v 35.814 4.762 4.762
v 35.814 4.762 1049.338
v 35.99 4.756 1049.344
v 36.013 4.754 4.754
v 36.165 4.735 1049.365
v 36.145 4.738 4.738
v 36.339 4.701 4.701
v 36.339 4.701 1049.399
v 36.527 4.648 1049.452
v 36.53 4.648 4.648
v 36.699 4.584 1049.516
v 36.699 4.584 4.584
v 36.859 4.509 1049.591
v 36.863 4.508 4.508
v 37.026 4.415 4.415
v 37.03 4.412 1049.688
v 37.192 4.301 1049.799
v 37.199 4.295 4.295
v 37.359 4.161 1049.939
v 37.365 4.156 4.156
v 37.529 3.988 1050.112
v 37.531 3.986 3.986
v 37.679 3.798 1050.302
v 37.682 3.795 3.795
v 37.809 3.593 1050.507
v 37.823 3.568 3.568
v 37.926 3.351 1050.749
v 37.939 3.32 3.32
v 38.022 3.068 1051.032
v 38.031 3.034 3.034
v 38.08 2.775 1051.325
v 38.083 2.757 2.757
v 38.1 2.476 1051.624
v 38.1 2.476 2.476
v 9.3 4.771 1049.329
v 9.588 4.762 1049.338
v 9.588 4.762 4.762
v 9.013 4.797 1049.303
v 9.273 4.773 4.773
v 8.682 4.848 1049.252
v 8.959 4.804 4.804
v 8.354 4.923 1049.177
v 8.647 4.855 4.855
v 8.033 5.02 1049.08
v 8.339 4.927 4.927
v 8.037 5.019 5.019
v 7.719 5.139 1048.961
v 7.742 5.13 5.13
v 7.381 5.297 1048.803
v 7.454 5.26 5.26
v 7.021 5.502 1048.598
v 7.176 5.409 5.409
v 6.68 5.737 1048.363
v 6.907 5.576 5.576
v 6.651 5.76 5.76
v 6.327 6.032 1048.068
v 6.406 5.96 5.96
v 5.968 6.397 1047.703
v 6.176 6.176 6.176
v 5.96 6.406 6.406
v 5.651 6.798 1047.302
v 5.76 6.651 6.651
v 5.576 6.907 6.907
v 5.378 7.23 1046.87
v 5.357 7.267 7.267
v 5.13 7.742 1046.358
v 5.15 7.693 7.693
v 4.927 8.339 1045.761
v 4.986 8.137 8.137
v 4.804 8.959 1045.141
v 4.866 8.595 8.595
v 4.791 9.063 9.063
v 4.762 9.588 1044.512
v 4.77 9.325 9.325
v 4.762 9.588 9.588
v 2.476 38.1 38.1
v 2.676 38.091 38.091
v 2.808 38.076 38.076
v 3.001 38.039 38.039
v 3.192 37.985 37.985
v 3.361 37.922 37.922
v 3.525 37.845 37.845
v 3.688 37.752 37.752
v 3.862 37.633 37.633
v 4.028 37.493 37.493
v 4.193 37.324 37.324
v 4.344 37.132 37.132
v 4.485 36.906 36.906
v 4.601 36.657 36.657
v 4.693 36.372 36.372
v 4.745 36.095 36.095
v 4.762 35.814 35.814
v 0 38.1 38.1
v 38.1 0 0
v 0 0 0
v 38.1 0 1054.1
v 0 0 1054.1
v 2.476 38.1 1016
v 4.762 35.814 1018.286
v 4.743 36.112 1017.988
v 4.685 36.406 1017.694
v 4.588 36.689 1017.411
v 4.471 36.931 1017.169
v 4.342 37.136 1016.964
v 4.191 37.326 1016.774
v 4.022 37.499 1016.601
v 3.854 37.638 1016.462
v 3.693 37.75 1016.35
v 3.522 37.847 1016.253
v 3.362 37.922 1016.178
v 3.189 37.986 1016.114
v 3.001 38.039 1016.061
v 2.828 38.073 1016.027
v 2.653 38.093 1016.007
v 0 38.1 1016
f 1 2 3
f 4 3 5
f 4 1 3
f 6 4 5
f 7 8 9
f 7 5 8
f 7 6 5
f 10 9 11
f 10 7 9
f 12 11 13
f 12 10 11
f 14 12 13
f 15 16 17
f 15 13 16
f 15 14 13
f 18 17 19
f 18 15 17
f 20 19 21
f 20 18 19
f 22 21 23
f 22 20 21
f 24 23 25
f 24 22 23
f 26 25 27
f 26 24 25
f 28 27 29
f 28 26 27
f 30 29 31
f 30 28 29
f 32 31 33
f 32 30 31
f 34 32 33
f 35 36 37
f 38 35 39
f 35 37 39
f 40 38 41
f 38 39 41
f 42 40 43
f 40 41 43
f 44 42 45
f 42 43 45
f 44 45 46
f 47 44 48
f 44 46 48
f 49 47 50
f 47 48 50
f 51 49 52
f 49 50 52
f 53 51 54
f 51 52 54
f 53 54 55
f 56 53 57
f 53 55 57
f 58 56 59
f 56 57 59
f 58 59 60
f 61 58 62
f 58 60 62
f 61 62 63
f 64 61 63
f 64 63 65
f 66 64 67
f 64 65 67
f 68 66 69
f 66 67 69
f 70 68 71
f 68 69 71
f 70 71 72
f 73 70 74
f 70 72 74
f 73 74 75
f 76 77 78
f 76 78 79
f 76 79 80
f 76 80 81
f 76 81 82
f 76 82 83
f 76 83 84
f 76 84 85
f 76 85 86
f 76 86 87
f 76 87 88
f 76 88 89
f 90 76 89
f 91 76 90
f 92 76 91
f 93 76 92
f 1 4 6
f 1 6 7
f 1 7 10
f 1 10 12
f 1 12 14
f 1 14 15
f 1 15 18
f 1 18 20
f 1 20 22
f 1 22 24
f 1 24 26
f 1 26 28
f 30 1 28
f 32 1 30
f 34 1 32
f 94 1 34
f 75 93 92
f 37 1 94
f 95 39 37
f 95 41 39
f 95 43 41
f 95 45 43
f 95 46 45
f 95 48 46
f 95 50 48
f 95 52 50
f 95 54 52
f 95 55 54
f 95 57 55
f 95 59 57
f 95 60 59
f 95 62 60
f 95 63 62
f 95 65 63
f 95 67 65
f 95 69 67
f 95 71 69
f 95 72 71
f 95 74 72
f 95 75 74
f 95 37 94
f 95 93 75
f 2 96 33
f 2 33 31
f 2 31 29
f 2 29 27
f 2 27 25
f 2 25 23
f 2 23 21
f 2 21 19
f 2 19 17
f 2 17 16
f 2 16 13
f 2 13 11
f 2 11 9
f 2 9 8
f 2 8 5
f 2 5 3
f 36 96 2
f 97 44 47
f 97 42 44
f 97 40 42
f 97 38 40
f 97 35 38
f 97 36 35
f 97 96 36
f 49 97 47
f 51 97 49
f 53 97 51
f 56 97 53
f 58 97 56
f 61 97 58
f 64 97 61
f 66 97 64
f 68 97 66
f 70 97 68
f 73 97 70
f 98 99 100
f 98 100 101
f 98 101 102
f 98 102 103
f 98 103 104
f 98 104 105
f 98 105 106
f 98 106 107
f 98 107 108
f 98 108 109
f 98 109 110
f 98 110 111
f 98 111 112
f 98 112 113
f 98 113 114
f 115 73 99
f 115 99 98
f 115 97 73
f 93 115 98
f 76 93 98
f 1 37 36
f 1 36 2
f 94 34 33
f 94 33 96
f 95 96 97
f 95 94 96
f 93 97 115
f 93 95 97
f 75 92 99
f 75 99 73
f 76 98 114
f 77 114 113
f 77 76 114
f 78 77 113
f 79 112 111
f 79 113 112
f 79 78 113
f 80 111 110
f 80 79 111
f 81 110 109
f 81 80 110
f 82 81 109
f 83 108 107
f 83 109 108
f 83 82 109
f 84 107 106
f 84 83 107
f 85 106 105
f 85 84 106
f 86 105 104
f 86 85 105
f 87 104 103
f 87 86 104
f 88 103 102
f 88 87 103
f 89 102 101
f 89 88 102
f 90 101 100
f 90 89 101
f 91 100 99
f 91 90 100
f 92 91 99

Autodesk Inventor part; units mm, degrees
ref_plane "Start plane" through (0, 0, 0) normal (0, 0, 1) x (1, 0, 0)
ref_plane "End plane" through (0, 0, 1054.1) normal (0, 0, 1) x (1, 0, 0)
sketch "Sketch" plane through (0, 0, 0) normal (0, 0, 1) x (1, 0, 0)
  line L0 (38.1, 0) -> (0, 0)
  line L1 (0, 0) -> (0, 38.1)
  line L2 (0, 38.1) -> (2.4765, 38.1)
  line L3 (4.7625, 35.814) -> (4.7625, 9.5885)
  line L4 (9.5885, 4.7625) -> (35.814, 4.7625)
  line L5 (38.1, 2.4765) -> (38.1, 0)
  line L6 (0, -11.0414) -> (0, 31.5385) construction
  line L7 (-11.0414, 0) -> (31.5385, 0) construction
  arc A0 (4.7625, 9.5885) -> (9.5885, 4.7625) centre (9.5885, 9.5885) ccw
  arc A1 (4.7625, 35.814) -> (2.4765, 38.1) centre (2.4765, 35.814) ccw
  arc A2 (38.1, 2.4765) -> (35.814, 4.7625) centre (35.814, 2.4765) ccw
  line L8 (0, 48.4964) -> (0, -20.9644) construction
  line L9 (-20.9644, 0) -> (48.4964, 0) construction
  point P0 (4.7625, 38.1)
  point P1 (4.7625, 4.7625)
  point P2 (38.1, 4.7625)
  dimension "d0" = 38.1
  dimension "d1" = 38.1
  dimension "d2" = 4.7625
  dimension "d3" = 4.7625
  dimension "d10" = 0
  dimension "d11" = 0
  dimension "d14" = 4.826
  dimension "d15" = 2.286
extrude "Body" add sketch "Sketch" along normal up to surface (1054.1 mm away) from surface at 0
sketch "Sketch3" plane through (0, 0, 0) normal (0, 0, 1) x (1, 0, 0)
  line L0 (0, 0) -> (10, 0)
ref_plane "Work Plane3" through (0, 0, 0) normal (0, -1, 0) x (1, 0, 0)
sketch "Sketch4" plane through (0, 0, 0) normal (0, -1, 0) x (1, 0, 0)
  line L0 (-2, 0) -> (12, 0)
  line L1 (-2, 1054.1) -> (12, 1054.1)
  dimension "d17" = 1054.1
ref_plane "Work Plane4" through (19.05, 0, 1054.1) normal (0, 0.7071, 0.7071) x (1, 0, 0)
split "Split1" plane through (19.05, 0, 1054.1) removes the side toward (0, 0.7071, 0.7071)
ref_plane "Work Plane5" through (19.05, 0, 0) normal (0, 0.7071, -0.7071) x (1, 0, 0)
split "Split2" plane through (19.05, 0, 0) removes the side toward (0, 0.7071, -0.7071)
equation "\"d0\" = G_H"
equation "\"d1\" = G_H"
equation "\"d2\" = G_T"
equation "\"d3\" = G_T"
equation "\"d14\" = G_IR"
equation "\"d15\" = G_ER"
equation "\"d4\" = G_L"
equation "\"G_H\" = 38.1"
equation "\"G_T\" = 4.7625"
equation "\"G_ER\" = 2.286"
equation "\"G_IR\" = 4.826"
equation "\"G_L\" = d17"
equation "\"ex\" = 0"
equation "\"G_OFFSET_START\" = 0"
equation "\"G_OFFSET_END\" = 0"
equation "\"d13\" = G_OFFSET_END + B_L"
equation "\"B_L\" = 1054.1"
properties part number "AISC - L 1.5 x 1.5 x 3/16 - 41.5" material "Aluminum 6061-AHC"
